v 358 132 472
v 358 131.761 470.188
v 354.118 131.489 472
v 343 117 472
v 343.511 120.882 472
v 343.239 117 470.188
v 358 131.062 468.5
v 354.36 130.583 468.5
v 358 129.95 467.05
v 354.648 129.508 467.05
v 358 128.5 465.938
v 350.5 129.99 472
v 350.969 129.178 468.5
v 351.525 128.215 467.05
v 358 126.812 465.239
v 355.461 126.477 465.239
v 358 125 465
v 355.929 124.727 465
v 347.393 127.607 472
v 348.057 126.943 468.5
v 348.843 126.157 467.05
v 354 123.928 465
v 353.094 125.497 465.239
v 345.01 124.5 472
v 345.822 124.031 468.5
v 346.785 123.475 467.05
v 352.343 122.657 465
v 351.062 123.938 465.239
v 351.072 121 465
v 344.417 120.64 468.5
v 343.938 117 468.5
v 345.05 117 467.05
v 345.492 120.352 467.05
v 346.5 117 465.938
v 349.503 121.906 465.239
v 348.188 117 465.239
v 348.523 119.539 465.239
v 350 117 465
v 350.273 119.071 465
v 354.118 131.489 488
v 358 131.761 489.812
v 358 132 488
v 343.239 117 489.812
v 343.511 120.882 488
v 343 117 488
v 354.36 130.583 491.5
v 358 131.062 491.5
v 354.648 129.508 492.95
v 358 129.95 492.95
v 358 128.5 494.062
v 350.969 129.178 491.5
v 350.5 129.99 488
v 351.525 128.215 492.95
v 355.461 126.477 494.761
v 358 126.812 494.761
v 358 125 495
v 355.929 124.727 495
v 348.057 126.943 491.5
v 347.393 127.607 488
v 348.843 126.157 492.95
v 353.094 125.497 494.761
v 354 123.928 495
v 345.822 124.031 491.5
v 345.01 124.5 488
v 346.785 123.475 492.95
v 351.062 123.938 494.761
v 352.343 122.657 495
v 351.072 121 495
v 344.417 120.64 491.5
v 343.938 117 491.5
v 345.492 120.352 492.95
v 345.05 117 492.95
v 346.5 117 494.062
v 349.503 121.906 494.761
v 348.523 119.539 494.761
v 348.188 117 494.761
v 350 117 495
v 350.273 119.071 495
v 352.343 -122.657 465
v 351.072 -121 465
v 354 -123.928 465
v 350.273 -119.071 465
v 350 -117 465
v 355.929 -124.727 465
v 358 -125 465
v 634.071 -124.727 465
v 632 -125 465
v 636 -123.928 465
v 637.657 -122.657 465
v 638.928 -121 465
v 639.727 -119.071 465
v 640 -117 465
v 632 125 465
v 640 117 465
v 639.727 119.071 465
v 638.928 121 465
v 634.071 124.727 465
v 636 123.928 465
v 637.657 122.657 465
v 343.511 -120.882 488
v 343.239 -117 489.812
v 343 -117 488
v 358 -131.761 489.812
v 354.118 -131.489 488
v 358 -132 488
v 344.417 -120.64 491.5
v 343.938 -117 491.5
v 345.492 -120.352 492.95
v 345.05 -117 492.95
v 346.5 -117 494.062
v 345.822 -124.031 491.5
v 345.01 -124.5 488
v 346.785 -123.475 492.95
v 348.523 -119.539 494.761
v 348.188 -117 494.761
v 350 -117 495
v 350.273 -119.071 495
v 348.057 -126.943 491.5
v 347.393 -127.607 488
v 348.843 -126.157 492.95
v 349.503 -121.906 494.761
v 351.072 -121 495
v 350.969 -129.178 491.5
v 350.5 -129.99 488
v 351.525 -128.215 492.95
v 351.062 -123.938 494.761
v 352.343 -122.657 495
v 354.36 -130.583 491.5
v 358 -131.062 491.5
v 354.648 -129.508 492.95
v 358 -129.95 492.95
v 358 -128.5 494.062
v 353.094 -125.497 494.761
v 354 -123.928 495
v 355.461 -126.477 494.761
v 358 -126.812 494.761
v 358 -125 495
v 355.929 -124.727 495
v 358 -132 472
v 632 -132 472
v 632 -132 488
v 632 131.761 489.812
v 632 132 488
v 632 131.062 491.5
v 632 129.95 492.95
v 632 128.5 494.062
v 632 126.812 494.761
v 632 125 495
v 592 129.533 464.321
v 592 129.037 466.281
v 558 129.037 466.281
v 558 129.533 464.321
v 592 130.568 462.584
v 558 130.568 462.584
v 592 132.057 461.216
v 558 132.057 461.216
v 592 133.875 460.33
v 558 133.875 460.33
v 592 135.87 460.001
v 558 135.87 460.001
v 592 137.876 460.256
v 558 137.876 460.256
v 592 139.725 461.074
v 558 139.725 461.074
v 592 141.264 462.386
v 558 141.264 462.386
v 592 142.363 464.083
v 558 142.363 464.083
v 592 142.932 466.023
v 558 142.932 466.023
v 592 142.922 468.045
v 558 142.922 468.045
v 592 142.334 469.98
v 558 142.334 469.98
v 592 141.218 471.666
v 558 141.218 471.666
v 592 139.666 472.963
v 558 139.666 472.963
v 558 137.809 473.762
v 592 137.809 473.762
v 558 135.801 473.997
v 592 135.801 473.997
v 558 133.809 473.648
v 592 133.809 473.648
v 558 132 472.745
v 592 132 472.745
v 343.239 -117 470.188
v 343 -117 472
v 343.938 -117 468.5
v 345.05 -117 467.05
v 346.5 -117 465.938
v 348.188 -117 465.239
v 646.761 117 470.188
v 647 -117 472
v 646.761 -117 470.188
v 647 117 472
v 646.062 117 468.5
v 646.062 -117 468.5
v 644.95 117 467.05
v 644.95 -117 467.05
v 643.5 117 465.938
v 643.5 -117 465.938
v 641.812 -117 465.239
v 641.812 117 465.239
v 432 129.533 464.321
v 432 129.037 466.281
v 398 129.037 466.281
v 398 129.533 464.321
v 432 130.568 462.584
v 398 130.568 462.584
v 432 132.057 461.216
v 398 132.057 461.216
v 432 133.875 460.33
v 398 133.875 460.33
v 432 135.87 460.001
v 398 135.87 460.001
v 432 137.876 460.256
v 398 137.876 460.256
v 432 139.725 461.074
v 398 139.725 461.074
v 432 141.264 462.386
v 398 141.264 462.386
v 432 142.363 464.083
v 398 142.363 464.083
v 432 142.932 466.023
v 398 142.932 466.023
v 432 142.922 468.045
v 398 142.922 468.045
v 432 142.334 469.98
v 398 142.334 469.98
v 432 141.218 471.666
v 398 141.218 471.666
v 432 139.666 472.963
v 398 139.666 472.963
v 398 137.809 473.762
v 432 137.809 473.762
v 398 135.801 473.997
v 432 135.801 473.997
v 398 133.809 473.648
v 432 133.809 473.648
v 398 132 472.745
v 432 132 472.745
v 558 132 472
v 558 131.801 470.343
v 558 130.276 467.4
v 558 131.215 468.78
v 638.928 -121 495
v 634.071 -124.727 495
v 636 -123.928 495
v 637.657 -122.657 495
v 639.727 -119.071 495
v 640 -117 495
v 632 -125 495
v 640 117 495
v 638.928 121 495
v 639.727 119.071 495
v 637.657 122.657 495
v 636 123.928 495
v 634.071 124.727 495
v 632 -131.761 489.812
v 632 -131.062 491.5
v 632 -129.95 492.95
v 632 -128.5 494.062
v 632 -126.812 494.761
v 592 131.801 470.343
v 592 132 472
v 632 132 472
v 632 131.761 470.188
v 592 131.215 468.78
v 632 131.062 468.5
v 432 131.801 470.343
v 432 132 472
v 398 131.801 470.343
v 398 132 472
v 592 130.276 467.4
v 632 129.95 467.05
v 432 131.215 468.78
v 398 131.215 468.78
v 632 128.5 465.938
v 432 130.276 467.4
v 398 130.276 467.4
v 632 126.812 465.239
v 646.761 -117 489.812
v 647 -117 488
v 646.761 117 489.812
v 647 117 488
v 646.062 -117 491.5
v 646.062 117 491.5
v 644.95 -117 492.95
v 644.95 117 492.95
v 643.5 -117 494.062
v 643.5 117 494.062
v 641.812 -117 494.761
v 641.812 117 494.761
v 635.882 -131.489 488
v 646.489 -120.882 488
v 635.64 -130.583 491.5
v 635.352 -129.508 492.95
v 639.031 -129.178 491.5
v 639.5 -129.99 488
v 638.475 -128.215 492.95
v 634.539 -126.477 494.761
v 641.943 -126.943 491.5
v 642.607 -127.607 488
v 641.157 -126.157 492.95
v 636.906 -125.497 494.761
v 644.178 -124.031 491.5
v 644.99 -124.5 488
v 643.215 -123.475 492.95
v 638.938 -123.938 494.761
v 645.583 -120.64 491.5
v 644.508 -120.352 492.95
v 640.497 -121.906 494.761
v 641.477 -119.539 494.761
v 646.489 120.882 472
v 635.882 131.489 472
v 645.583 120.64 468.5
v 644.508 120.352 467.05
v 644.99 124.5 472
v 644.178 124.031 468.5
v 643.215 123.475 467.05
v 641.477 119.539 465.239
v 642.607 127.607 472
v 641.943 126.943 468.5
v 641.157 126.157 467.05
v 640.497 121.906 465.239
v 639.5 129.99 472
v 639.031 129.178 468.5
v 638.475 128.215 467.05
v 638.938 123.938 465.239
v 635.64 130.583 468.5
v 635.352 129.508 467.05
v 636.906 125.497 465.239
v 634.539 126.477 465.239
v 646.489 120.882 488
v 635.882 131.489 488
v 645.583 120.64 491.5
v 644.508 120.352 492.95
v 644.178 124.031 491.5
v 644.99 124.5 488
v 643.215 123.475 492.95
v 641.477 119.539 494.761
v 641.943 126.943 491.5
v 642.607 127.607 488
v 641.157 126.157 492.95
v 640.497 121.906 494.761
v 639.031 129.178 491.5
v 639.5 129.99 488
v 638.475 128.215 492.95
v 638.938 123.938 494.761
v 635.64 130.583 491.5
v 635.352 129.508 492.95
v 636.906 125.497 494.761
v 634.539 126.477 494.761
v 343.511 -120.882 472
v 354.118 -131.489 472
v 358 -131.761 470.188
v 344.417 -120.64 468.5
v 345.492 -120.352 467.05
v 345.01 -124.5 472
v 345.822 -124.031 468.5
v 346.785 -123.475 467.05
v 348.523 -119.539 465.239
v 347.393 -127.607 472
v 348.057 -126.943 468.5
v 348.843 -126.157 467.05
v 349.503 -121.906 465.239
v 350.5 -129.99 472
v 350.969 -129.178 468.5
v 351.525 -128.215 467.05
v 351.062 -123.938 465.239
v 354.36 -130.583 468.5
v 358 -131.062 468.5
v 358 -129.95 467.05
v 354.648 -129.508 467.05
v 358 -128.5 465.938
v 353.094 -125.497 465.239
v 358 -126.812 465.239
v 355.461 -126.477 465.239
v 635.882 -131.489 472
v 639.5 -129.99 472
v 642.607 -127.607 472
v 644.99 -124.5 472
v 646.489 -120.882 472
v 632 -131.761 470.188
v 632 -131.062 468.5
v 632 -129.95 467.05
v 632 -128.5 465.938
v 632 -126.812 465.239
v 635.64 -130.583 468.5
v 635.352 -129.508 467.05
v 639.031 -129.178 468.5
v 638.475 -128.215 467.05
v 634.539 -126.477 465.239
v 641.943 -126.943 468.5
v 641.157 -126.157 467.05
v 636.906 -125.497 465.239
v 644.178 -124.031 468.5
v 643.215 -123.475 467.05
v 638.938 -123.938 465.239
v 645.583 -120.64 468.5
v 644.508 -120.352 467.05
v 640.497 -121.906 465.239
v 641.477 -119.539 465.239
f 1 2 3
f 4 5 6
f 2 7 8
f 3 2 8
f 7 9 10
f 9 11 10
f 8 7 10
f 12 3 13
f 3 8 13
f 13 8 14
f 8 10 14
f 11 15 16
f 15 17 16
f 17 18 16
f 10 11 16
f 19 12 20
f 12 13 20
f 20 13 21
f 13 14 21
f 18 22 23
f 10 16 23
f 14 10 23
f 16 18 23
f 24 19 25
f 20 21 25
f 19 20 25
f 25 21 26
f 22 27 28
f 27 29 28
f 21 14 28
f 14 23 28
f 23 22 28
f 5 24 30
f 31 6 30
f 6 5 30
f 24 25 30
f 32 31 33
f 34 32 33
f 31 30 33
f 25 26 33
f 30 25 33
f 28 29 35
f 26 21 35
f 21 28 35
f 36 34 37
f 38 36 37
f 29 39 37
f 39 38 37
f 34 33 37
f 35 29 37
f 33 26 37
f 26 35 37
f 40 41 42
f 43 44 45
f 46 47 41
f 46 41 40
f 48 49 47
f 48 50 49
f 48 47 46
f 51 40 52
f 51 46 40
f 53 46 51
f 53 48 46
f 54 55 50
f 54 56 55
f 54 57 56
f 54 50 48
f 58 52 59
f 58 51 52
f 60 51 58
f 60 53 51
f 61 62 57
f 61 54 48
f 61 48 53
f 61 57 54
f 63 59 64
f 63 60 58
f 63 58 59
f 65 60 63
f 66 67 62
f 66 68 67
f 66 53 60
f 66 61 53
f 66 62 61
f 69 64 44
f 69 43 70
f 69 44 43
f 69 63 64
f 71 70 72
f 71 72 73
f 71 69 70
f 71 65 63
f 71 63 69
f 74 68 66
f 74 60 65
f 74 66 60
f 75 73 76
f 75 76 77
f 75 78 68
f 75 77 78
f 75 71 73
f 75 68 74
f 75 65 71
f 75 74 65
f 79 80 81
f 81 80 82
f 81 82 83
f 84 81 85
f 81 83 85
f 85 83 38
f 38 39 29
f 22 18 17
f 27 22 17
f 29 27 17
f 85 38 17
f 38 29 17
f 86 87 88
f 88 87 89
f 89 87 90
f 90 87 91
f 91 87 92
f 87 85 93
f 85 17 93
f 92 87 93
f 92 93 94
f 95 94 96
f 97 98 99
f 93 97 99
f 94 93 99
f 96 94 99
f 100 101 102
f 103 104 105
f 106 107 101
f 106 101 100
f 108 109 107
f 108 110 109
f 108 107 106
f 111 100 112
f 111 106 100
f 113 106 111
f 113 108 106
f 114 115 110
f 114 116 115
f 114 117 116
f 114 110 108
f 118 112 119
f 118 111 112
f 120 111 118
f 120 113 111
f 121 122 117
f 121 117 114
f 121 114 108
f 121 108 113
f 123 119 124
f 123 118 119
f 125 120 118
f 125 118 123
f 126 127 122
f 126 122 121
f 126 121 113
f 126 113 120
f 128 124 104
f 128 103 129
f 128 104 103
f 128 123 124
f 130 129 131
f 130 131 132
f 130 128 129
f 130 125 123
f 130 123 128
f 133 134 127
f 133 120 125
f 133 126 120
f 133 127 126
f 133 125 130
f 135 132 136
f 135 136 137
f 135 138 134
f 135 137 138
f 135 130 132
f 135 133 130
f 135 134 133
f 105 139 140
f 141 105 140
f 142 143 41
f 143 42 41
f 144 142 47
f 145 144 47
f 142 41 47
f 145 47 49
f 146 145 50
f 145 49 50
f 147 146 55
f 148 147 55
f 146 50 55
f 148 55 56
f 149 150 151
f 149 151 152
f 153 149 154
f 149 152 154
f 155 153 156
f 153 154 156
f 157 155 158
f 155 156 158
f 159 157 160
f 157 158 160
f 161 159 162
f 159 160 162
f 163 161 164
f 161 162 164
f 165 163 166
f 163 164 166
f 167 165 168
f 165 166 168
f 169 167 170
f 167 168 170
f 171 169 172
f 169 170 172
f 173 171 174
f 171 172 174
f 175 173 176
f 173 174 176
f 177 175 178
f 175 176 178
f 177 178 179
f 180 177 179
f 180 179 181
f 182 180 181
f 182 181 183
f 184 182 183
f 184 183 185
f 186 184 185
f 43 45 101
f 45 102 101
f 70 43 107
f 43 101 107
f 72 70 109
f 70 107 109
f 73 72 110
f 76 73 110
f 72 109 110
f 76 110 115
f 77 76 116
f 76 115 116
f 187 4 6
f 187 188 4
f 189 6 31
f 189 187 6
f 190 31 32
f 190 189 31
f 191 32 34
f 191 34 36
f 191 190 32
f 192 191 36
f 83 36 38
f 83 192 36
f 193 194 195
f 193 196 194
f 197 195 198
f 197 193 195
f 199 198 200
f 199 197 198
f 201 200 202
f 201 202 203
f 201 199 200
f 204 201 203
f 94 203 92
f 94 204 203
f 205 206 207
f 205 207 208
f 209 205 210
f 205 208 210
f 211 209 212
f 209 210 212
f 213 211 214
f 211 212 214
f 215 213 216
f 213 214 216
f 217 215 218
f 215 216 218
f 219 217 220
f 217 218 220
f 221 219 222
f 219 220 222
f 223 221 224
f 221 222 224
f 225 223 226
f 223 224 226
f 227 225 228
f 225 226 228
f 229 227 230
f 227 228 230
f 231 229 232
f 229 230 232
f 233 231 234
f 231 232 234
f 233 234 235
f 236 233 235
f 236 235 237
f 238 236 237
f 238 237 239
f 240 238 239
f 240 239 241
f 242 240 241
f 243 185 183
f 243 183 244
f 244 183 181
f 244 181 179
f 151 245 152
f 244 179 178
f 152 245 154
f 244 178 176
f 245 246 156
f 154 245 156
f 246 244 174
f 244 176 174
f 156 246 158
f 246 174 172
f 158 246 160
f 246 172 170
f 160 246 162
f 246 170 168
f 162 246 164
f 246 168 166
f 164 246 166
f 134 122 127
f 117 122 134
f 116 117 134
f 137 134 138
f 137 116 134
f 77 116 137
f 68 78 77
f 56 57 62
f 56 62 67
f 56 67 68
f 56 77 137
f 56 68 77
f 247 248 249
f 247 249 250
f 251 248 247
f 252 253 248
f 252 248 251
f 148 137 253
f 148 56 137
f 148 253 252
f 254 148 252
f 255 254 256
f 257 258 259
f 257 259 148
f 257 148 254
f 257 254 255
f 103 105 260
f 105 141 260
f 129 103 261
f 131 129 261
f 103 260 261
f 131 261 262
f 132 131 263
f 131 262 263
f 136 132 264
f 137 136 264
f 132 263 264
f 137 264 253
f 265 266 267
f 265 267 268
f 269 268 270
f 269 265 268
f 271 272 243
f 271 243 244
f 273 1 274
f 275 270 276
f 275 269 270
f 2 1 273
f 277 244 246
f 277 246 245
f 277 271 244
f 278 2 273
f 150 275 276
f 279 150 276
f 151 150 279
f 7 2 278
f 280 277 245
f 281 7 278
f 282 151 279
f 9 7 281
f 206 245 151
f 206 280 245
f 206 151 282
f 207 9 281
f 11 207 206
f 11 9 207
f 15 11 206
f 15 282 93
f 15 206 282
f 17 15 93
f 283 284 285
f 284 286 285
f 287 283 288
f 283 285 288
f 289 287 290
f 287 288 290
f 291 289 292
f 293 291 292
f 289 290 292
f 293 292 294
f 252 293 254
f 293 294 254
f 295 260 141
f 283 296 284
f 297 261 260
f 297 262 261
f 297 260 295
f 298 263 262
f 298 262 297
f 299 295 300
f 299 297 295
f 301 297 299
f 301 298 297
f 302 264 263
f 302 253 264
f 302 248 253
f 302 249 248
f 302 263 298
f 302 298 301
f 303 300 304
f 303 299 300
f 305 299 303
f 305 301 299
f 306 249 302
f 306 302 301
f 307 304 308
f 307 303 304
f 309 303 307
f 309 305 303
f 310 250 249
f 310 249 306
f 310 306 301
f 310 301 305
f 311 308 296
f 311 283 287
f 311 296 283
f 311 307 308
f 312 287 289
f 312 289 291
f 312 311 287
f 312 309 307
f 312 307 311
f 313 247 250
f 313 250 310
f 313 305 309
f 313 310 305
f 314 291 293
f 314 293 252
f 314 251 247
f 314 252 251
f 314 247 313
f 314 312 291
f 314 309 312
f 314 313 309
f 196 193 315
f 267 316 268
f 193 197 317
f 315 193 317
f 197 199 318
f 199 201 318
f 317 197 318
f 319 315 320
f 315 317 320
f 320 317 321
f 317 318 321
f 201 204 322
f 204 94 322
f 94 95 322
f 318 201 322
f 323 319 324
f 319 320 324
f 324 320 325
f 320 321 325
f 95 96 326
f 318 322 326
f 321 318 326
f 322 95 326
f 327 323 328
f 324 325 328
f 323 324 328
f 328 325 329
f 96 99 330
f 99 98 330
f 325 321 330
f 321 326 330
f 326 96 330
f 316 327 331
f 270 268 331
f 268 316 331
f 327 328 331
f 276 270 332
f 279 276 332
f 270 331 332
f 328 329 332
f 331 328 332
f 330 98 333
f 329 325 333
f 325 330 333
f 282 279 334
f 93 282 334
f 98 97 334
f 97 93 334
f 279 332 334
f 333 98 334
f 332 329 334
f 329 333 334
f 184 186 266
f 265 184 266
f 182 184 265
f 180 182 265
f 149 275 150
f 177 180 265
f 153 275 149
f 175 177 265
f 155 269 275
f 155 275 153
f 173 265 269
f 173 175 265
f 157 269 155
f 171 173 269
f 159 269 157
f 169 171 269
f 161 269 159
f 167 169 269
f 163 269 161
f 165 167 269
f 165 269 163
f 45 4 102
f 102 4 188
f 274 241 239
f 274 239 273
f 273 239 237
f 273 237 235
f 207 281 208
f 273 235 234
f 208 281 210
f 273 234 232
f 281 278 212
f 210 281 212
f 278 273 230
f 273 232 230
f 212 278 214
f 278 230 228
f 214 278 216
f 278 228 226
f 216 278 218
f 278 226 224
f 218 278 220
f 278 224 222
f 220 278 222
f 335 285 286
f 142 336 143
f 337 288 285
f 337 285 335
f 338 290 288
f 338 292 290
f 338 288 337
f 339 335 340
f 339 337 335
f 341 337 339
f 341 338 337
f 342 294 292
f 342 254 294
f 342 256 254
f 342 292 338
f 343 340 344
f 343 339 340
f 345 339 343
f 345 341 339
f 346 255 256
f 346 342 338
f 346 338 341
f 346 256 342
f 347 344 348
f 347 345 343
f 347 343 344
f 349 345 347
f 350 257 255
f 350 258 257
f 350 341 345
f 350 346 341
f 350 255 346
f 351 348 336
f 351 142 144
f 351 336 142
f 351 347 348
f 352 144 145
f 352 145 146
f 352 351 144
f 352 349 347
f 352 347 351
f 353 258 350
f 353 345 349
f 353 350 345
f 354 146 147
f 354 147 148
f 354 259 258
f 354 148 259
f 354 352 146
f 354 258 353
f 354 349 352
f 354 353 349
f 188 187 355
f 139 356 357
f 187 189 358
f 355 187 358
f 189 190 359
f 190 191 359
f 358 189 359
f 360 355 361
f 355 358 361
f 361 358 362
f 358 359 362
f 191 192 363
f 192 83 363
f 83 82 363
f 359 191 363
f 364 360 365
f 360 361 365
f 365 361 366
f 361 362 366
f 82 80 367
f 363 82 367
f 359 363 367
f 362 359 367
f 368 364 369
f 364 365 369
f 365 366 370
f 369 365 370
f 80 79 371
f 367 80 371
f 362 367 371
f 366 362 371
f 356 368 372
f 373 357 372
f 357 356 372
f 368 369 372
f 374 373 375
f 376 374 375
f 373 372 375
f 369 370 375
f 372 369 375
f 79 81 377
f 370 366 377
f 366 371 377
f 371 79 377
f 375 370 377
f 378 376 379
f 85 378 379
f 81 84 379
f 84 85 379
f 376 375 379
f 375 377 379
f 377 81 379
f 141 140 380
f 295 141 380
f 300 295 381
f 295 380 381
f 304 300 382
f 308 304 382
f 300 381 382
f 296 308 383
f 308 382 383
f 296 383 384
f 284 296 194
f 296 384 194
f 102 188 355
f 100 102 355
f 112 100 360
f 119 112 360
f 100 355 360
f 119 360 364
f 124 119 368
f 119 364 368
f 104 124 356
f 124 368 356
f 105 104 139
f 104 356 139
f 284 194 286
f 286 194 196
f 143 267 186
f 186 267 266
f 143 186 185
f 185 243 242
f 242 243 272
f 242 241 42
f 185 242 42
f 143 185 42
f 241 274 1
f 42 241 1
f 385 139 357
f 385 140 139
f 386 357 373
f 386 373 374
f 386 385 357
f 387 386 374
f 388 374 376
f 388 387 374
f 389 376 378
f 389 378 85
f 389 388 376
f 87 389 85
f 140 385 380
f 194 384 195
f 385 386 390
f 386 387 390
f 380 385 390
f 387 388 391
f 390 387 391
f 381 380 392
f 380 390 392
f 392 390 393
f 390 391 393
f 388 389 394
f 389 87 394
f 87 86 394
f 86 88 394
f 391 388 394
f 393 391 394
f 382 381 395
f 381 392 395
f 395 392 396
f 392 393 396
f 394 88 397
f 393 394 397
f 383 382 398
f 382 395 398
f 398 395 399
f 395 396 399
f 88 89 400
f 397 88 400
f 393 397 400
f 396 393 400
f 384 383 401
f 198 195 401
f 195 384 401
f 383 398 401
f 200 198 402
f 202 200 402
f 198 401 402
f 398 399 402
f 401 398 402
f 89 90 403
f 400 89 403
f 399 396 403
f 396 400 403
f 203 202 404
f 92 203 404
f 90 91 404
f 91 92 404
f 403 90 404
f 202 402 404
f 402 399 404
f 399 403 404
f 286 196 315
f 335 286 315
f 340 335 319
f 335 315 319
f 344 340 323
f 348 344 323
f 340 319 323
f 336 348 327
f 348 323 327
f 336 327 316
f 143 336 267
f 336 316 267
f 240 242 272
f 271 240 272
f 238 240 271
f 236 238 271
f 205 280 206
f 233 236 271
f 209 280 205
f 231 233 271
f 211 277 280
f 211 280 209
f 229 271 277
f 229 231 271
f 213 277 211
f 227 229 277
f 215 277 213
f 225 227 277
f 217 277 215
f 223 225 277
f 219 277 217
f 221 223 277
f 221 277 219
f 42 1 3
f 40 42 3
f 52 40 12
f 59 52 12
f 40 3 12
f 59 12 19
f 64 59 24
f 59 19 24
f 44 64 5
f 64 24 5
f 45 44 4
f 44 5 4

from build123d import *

# Parameters (mm, degrees)
BLOCK_START            = 465
BLOCK_1_DEPTH          = 30
BLOCK_EDGE_FILLET_1_R  = 7
EXTRUDE_START          = -17
EXTRUDE_SKETCH_1_R     = 7
EXTRUDE_1_DEPTH        = 34
EXTRUDE_ROTATE_1_ANGLE = 90
EXTRUDE_SKETCH_2_R     = 7
EXTRUDE_2_DEPTH        = 34
EXTRUDE_ROTATE_2_ANGLE = 90


with BuildPart() as part:
    # Block sketch 1 → Block 1 (new body)
    with BuildSketch(Plane.XY.offset(BLOCK_START)):
        with BuildLine():
            Line((358, -132), (632, -132))
            ThreePointArc((632, -132), (642.606601718, -127.606601718), (647, -117))
            Line((647, -117), (647, 117))
            ThreePointArc((647, 117), (642.606601718, 127.606601718), (632, 132))
            Line((632, 132), (358, 132))
            ThreePointArc((358, 132), (347.393398282, 127.606601718), (343, 117))
            Line((343, 117), (343, -117))
            ThreePointArc((343, -117), (347.393398282, -127.606601718), (358, -132))
        make_face()
    extrude(amount=BLOCK_1_DEPTH)

    # Block edge fillet 1
    block_edge_fillet_1_edges = [part.edges().sort_by_distance(p)[0] for p in [
        (647, 0, 465),
        (642.606601718, -127.606601718, 465),
        (495, -132, 465),
        (347.393398282, -127.606601718, 465),
        (642.606601718, -127.606601718, 495),
        (647, 0, 495),
        (642.606601718, 127.606601718, 495),
        (495, 132, 495),
        (347.393398282, 127.606601718, 495),
        (343, 0, 495),
        (347.393398282, -127.606601718, 495),
        (343, 0, 465),
        (495, -132, 495),
        (347.393398282, 127.606601718, 465),
        (495, 132, 465),
        (642.606601718, 127.606601718, 465),
    ]]
    fillet(block_edge_fillet_1_edges, radius=BLOCK_EDGE_FILLET_1_R)


with BuildPart() as body_2:
    # Extrude sketch 1 → Extrude 1 (new body)
    with BuildSketch(Plane.XY.offset(EXTRUDE_START)):
        Circle(EXTRUDE_SKETCH_1_R)
    extrude(amount=EXTRUDE_1_DEPTH)


with BuildPart() as body_2_1:
    # Extrude rotate 1: moved
    add(body_2.part.rotate(Axis((0, 0, 0), (0, 1, 0)), EXTRUDE_ROTATE_1_ANGLE))


with BuildPart() as body_2_2:
    # Extrude place 1: moved
    add(body_2_1.part.moved(Location((415, 136, 467))))


with BuildPart() as body_3:
    # Extrude sketch 2 → Extrude 2 (new body)
    with BuildSketch(Plane.XY.offset(EXTRUDE_START)):
        Circle(EXTRUDE_SKETCH_2_R)
    extrude(amount=EXTRUDE_2_DEPTH)


with BuildPart() as body_3_1:
    # Extrude rotate 2: moved
    add(body_3.part.rotate(Axis((0, 0, 0), (0, 1, 0)), EXTRUDE_ROTATE_2_ANGLE))


with BuildPart() as body_3_2:
    # Extrude place 2: moved
    add(body_3_1.part.moved(Location((575, 136, 467))))


with BuildPart() as part_1:
    add(part.part)

    # Combine (weld / assembly of features): union body 3, body 2
    add(body_3_2.part)
    add(body_2_2.part)


solid = part_1.part
